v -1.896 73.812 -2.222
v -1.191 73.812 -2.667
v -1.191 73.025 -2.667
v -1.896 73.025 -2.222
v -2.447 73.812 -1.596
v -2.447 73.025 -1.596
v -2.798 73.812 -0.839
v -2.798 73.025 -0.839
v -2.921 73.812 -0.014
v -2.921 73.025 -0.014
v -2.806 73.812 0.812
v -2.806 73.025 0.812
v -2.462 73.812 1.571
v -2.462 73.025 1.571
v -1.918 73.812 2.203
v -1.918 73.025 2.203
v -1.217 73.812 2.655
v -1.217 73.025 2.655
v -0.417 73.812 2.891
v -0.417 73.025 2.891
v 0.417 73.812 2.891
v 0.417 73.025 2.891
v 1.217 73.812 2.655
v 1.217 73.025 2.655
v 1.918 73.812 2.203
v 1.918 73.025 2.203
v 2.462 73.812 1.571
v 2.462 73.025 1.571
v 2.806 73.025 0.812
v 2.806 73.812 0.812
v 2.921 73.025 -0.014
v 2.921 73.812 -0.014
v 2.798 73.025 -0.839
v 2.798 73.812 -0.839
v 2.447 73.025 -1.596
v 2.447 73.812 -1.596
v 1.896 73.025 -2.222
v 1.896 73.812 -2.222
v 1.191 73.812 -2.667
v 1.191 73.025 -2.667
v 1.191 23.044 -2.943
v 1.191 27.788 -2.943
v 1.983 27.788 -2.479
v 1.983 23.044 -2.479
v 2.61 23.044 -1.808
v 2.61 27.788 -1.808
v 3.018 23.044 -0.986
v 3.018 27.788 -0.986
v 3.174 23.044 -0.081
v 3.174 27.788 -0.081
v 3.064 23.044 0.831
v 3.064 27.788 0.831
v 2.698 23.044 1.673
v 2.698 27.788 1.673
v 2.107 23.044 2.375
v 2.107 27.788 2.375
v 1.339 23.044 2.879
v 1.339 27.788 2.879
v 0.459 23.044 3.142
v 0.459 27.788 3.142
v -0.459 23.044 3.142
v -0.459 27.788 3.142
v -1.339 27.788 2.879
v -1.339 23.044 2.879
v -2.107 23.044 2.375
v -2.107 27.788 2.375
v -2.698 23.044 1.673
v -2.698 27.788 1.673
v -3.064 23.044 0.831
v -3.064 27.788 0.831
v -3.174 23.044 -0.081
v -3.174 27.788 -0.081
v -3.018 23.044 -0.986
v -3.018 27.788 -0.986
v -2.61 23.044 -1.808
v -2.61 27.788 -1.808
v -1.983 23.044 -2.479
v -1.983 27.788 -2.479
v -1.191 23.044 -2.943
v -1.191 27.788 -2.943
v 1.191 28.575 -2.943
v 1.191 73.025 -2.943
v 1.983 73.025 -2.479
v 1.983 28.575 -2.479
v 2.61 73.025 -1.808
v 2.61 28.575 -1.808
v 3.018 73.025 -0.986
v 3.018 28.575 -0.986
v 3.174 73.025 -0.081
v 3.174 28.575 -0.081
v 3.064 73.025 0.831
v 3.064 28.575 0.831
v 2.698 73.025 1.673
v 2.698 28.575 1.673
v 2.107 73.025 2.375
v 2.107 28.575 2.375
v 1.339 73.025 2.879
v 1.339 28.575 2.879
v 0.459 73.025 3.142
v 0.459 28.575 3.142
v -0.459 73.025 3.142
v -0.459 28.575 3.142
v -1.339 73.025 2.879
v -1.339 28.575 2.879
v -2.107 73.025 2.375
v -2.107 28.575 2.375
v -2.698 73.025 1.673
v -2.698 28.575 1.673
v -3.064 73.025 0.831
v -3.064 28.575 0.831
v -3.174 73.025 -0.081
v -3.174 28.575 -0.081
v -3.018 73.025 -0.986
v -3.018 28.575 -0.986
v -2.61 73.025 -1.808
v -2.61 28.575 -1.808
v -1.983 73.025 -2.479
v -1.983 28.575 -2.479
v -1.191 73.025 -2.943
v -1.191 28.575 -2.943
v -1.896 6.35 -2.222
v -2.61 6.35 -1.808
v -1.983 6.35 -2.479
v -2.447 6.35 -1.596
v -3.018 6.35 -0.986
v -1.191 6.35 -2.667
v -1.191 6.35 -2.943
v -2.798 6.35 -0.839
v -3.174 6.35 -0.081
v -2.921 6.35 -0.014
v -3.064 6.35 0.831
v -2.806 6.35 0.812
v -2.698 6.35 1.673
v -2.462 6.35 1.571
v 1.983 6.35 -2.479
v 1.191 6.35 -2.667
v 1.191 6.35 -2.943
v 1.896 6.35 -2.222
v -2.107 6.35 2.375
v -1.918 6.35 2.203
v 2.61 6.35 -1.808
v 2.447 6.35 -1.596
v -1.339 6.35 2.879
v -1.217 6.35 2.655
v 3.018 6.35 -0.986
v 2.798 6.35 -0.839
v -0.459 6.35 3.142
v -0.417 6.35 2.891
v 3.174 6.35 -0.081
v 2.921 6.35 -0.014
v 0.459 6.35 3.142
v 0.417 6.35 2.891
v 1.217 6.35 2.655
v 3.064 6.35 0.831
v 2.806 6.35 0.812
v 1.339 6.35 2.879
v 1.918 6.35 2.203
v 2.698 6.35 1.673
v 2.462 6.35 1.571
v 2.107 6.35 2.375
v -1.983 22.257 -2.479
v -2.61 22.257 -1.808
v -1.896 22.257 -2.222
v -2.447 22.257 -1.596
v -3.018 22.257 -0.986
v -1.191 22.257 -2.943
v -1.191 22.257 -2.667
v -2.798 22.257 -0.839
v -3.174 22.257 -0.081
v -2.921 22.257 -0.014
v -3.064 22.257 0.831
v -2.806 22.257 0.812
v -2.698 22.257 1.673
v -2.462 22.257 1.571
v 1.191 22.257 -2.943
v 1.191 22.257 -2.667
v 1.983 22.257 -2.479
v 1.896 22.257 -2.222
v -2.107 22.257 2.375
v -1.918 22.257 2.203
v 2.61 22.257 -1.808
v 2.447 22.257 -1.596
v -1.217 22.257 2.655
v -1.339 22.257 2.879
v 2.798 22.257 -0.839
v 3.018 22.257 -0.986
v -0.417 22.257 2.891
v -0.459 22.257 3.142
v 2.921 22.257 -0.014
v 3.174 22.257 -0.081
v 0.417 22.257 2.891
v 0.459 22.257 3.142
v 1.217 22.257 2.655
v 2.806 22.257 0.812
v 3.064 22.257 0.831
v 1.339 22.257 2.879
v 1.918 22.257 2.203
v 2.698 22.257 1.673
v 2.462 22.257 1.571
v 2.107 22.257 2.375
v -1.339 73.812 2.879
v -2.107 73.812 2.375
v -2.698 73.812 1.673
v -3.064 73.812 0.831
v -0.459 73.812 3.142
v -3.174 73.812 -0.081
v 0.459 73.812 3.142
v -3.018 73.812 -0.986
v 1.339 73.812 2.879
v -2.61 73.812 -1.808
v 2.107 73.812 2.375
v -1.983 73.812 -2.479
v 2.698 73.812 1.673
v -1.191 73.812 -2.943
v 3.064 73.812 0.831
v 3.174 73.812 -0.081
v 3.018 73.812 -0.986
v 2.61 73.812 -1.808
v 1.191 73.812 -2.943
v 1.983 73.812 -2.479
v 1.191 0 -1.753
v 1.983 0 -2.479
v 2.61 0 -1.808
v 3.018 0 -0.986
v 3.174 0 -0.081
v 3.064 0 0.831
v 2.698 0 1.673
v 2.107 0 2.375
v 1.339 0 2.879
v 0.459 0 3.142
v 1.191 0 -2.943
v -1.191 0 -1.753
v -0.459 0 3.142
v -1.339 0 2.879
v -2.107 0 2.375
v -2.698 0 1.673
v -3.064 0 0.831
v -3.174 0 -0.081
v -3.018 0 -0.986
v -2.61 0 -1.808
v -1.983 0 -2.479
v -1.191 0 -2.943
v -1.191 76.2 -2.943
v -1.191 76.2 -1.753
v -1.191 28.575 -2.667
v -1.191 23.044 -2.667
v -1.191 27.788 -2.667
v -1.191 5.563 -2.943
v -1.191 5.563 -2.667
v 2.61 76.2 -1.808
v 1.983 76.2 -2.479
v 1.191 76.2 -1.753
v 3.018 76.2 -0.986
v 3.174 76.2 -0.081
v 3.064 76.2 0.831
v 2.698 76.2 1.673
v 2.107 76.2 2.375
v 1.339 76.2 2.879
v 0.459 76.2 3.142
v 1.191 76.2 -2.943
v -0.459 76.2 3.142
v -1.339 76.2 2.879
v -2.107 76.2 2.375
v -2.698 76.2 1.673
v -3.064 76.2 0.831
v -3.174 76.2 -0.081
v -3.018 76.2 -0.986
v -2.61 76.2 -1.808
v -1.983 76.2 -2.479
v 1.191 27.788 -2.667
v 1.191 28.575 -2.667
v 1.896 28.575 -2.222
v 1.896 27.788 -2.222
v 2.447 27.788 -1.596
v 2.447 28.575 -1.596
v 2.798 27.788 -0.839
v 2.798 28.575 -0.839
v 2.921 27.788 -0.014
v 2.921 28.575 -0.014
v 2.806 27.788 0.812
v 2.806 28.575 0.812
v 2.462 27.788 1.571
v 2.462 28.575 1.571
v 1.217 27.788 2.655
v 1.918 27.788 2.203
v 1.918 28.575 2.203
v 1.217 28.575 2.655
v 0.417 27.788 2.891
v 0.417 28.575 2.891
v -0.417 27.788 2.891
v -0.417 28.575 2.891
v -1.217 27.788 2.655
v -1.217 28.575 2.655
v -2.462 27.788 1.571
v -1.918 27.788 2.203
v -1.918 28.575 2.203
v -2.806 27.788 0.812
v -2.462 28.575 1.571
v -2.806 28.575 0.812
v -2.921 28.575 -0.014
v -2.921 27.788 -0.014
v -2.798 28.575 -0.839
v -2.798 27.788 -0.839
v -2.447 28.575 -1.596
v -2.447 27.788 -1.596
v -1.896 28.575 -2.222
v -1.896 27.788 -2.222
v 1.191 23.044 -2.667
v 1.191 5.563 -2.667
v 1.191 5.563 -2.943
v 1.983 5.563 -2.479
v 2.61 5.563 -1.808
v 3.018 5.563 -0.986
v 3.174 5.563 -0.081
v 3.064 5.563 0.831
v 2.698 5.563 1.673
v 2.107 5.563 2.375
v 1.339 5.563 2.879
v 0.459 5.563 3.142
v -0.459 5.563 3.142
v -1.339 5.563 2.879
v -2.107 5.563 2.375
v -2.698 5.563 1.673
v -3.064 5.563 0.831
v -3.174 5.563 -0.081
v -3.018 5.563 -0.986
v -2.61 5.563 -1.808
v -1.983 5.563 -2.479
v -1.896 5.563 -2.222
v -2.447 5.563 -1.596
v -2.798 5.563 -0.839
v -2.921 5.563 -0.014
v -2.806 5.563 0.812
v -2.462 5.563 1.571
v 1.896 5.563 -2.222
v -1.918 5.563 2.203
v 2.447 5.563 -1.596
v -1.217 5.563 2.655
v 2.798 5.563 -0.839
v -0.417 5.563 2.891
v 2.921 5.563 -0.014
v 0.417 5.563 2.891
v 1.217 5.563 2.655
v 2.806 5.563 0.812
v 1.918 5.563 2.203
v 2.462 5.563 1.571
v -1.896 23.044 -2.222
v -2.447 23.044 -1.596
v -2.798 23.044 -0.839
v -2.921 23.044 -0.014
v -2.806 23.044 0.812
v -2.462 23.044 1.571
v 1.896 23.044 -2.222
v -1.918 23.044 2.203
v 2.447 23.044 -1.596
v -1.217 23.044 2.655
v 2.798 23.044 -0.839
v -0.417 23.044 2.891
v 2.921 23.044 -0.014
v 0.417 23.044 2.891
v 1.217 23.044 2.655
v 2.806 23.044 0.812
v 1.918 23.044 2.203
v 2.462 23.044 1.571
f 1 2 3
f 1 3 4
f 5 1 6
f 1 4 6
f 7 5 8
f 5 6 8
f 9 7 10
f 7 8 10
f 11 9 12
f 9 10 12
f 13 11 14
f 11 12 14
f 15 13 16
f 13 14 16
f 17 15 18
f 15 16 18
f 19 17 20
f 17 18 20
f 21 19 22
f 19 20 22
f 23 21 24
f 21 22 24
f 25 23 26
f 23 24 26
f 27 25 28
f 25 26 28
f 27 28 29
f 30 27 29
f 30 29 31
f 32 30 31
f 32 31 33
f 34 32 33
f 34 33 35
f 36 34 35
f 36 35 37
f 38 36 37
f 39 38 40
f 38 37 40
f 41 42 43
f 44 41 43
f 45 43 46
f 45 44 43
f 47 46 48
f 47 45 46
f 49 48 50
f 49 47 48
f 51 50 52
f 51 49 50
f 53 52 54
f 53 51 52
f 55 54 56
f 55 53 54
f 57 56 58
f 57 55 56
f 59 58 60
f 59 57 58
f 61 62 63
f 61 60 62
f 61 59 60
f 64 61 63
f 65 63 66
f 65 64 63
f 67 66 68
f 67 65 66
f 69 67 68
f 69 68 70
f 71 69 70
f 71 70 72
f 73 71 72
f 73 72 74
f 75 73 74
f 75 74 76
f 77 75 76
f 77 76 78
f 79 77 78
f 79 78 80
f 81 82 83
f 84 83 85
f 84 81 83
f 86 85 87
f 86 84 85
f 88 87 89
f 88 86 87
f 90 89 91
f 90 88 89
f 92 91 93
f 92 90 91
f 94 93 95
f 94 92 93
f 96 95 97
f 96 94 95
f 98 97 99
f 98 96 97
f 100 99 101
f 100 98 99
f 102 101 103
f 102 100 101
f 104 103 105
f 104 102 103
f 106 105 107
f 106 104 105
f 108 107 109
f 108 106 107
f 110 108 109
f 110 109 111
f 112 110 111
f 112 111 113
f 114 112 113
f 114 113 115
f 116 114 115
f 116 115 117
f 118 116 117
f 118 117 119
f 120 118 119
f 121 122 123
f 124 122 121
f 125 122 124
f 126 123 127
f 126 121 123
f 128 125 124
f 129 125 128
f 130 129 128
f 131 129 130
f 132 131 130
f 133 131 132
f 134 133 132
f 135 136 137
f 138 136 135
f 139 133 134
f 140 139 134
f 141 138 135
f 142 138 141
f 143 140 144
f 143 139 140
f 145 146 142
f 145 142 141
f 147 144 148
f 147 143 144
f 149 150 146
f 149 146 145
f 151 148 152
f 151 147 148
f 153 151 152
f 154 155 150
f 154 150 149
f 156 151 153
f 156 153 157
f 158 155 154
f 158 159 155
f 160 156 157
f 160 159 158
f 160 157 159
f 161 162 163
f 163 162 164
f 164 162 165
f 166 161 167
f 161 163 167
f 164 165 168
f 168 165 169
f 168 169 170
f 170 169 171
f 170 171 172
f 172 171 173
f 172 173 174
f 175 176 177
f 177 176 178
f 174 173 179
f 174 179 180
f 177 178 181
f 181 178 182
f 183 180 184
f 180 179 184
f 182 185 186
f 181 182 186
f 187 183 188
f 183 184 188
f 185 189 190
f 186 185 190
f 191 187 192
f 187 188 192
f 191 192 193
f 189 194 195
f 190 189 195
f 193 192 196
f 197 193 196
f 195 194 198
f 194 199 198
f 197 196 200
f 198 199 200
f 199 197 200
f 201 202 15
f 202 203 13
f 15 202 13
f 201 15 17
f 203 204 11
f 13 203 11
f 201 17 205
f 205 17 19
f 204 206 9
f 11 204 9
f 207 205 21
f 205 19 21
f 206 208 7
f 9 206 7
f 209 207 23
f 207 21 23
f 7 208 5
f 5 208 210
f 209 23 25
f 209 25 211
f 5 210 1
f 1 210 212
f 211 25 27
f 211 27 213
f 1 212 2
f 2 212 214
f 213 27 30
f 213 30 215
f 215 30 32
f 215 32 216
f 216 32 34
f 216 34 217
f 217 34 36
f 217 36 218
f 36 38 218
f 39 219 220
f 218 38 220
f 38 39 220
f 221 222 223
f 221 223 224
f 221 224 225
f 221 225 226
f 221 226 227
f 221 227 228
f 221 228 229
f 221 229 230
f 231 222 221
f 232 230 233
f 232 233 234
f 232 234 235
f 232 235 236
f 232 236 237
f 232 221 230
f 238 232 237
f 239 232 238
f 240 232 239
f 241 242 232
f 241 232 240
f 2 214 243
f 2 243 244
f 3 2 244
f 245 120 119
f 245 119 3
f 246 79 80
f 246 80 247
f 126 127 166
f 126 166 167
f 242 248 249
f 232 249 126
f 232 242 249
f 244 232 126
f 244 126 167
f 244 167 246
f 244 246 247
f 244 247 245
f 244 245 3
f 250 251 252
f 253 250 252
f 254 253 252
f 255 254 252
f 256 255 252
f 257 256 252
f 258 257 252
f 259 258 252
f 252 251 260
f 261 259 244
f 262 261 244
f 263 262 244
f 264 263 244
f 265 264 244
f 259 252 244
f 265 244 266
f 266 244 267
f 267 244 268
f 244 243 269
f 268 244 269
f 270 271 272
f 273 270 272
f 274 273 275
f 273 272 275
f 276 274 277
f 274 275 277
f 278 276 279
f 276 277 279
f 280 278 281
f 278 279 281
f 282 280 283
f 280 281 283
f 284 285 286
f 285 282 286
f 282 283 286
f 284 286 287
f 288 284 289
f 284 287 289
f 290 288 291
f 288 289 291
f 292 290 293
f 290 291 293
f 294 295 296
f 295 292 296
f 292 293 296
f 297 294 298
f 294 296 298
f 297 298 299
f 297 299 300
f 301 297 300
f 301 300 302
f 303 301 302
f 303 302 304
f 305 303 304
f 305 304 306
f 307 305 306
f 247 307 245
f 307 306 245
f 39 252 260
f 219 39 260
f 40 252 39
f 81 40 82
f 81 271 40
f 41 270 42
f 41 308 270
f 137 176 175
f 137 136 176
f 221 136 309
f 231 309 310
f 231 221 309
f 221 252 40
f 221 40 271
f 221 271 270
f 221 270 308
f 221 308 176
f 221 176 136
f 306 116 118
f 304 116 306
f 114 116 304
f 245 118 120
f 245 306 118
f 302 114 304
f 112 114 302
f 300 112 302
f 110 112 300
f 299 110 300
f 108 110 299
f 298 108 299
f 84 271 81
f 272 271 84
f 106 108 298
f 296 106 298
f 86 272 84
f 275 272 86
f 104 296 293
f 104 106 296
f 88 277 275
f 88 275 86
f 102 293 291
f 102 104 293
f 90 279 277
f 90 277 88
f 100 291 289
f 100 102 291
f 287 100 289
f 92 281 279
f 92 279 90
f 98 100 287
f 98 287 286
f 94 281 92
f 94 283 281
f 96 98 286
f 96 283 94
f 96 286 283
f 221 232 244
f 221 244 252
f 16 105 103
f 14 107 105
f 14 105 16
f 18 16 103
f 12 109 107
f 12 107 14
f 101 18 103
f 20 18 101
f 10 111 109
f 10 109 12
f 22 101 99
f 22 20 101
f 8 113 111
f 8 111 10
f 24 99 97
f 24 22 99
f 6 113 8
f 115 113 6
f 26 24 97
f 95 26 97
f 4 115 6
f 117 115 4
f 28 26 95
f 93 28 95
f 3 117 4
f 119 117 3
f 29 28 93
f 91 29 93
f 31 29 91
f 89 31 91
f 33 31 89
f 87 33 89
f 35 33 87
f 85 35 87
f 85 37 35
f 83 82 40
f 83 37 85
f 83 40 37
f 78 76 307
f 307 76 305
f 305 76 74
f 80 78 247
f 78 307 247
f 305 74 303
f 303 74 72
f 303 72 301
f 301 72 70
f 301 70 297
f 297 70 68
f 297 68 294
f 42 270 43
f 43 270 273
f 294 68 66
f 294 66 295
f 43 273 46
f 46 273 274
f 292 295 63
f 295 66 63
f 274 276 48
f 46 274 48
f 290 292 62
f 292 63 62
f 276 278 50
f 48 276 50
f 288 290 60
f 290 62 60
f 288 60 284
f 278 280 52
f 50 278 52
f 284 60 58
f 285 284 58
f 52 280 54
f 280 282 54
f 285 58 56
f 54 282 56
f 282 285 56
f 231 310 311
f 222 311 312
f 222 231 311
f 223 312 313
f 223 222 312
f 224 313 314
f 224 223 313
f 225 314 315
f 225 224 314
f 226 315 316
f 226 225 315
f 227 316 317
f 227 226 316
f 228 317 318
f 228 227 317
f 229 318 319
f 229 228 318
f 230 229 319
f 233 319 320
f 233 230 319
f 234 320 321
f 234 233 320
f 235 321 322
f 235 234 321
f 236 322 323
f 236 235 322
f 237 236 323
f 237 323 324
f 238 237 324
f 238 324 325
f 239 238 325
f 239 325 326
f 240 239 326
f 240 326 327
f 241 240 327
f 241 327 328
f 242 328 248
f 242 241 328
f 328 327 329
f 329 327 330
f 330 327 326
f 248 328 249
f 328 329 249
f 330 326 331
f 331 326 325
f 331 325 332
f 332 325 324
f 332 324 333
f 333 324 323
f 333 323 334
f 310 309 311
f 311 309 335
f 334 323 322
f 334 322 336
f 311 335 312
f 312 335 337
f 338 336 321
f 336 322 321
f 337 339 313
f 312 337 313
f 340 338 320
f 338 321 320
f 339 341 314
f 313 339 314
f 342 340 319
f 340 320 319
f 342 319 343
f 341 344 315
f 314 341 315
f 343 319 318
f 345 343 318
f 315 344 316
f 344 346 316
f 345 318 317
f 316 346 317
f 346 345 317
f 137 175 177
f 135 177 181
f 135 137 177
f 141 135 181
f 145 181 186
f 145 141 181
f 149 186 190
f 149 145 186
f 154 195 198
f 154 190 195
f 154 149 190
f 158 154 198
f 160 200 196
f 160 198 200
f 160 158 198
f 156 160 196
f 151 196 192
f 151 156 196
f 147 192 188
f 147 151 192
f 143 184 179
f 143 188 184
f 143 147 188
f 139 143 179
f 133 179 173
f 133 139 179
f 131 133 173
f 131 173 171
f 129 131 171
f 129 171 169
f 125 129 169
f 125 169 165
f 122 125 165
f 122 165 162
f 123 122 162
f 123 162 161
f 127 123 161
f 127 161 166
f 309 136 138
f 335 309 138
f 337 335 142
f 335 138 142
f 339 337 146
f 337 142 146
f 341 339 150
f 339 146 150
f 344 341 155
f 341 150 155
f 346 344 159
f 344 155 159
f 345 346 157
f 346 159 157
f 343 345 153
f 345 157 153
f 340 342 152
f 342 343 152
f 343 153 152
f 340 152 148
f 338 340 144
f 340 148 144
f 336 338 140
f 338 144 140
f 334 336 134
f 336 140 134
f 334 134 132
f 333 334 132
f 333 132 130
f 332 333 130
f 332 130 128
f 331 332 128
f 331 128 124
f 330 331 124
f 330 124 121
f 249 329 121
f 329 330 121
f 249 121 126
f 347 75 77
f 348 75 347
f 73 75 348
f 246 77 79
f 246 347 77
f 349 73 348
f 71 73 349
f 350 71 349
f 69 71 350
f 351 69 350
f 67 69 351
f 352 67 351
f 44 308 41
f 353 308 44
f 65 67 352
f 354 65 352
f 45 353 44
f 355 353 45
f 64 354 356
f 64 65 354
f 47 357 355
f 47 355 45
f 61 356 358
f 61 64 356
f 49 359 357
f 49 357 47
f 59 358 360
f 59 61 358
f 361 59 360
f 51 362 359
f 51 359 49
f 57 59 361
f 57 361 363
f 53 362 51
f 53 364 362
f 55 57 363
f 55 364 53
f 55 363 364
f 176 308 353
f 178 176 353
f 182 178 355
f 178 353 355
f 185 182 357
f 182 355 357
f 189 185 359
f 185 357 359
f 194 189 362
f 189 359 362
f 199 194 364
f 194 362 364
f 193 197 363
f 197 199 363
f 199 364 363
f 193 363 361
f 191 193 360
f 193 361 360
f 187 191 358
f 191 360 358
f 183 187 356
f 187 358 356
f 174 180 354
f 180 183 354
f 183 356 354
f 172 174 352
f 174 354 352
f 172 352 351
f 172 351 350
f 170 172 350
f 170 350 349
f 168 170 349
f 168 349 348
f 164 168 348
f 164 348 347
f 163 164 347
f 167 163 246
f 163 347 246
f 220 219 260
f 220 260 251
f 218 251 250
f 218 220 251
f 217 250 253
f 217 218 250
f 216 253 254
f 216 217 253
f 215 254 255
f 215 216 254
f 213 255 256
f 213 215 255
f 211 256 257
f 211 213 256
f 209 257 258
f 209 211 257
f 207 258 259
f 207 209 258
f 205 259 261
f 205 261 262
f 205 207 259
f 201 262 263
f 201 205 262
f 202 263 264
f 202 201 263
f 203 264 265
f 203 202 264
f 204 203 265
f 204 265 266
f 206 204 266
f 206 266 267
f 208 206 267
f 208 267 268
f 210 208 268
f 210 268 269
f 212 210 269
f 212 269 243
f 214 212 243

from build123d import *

# Parameters (mm, degrees)
BOSS_EXTRUDE1_DEPTH = 76.2
CUT_EXTRUDE1_START  = -3.175
SKETCH2_R           = 3.175
SKETCH2_R_2         = 2.921
CUT_EXTRUDE1_DEPTH  = 0.7874
CUT_EXTRUDE2_START  = -6.35
SKETCH3_R           = 3.175
SKETCH3_R_2         = 2.921
CUT_EXTRUDE2_DEPTH  = 0.7874
CUT_EXTRUDE3_START  = -23.04415
SKETCH3_5_R         = 3.175
SKETCH3_5_R_2       = 2.921
CUT_EXTRUDE3_DEPTH  = 0.7874
CUT_EXTRUDE4_START  = -28.575
SKETCH3_6_R         = 3.175
SKETCH3_6_R_2       = 2.921
CUT_EXTRUDE4_DEPTH  = 0.7874


with BuildPart() as part:
    # Sketch1 → Boss-Extrude1 (new body)
    with BuildSketch(Plane(origin=(0, 0, 0), x_dir=(1, 0, 0), z_dir=(0, 1, 0))):
        with BuildLine():
            Line((-1.190625, 2.943303775), (-1.190625, 1.752678775))
            Line((-1.190625, 1.752678775), (1.190625, 1.752678775))
            Line((1.190625, 1.752678775), (1.190625, 2.943303775))
            ThreePointArc((1.190625, 2.943303775), (0, -3.175), (-1.190625, 2.943303775))
        make_face()
    extrude(amount=BOSS_EXTRUDE1_DEPTH)

    # Sketch2 → Cut-Extrude1 (cut)
    with BuildSketch(Plane(origin=(0, 76.2, 0), x_dir=(1, 0, 0), z_dir=(0, 1, 0)).offset(CUT_EXTRUDE1_START)):
        Circle(SKETCH2_R)
        Circle(SKETCH2_R_2, mode=Mode.SUBTRACT)
    extrude(amount=CUT_EXTRUDE1_DEPTH, mode=Mode.SUBTRACT)

    # Sketch3 → Cut-Extrude2 (cut)
    with BuildSketch(Plane.XZ.offset(CUT_EXTRUDE2_START)):
        Circle(SKETCH3_R)
        Circle(SKETCH3_R_2, mode=Mode.SUBTRACT)
    extrude(amount=CUT_EXTRUDE2_DEPTH, mode=Mode.SUBTRACT)

    # Sketch3<5> → Cut-Extrude3 (cut)
    with BuildSketch(Plane.XZ.offset(CUT_EXTRUDE3_START)):
        Circle(SKETCH3_5_R)
        Circle(SKETCH3_5_R_2, mode=Mode.SUBTRACT)
    extrude(amount=CUT_EXTRUDE3_DEPTH, mode=Mode.SUBTRACT)

    # Sketch3<6> → Cut-Extrude4 (cut)
    with BuildSketch(Plane.XZ.offset(CUT_EXTRUDE4_START)):
        Circle(SKETCH3_6_R)
        Circle(SKETCH3_6_R_2, mode=Mode.SUBTRACT)
    extrude(amount=CUT_EXTRUDE4_DEPTH, mode=Mode.SUBTRACT)


solid = part.part
